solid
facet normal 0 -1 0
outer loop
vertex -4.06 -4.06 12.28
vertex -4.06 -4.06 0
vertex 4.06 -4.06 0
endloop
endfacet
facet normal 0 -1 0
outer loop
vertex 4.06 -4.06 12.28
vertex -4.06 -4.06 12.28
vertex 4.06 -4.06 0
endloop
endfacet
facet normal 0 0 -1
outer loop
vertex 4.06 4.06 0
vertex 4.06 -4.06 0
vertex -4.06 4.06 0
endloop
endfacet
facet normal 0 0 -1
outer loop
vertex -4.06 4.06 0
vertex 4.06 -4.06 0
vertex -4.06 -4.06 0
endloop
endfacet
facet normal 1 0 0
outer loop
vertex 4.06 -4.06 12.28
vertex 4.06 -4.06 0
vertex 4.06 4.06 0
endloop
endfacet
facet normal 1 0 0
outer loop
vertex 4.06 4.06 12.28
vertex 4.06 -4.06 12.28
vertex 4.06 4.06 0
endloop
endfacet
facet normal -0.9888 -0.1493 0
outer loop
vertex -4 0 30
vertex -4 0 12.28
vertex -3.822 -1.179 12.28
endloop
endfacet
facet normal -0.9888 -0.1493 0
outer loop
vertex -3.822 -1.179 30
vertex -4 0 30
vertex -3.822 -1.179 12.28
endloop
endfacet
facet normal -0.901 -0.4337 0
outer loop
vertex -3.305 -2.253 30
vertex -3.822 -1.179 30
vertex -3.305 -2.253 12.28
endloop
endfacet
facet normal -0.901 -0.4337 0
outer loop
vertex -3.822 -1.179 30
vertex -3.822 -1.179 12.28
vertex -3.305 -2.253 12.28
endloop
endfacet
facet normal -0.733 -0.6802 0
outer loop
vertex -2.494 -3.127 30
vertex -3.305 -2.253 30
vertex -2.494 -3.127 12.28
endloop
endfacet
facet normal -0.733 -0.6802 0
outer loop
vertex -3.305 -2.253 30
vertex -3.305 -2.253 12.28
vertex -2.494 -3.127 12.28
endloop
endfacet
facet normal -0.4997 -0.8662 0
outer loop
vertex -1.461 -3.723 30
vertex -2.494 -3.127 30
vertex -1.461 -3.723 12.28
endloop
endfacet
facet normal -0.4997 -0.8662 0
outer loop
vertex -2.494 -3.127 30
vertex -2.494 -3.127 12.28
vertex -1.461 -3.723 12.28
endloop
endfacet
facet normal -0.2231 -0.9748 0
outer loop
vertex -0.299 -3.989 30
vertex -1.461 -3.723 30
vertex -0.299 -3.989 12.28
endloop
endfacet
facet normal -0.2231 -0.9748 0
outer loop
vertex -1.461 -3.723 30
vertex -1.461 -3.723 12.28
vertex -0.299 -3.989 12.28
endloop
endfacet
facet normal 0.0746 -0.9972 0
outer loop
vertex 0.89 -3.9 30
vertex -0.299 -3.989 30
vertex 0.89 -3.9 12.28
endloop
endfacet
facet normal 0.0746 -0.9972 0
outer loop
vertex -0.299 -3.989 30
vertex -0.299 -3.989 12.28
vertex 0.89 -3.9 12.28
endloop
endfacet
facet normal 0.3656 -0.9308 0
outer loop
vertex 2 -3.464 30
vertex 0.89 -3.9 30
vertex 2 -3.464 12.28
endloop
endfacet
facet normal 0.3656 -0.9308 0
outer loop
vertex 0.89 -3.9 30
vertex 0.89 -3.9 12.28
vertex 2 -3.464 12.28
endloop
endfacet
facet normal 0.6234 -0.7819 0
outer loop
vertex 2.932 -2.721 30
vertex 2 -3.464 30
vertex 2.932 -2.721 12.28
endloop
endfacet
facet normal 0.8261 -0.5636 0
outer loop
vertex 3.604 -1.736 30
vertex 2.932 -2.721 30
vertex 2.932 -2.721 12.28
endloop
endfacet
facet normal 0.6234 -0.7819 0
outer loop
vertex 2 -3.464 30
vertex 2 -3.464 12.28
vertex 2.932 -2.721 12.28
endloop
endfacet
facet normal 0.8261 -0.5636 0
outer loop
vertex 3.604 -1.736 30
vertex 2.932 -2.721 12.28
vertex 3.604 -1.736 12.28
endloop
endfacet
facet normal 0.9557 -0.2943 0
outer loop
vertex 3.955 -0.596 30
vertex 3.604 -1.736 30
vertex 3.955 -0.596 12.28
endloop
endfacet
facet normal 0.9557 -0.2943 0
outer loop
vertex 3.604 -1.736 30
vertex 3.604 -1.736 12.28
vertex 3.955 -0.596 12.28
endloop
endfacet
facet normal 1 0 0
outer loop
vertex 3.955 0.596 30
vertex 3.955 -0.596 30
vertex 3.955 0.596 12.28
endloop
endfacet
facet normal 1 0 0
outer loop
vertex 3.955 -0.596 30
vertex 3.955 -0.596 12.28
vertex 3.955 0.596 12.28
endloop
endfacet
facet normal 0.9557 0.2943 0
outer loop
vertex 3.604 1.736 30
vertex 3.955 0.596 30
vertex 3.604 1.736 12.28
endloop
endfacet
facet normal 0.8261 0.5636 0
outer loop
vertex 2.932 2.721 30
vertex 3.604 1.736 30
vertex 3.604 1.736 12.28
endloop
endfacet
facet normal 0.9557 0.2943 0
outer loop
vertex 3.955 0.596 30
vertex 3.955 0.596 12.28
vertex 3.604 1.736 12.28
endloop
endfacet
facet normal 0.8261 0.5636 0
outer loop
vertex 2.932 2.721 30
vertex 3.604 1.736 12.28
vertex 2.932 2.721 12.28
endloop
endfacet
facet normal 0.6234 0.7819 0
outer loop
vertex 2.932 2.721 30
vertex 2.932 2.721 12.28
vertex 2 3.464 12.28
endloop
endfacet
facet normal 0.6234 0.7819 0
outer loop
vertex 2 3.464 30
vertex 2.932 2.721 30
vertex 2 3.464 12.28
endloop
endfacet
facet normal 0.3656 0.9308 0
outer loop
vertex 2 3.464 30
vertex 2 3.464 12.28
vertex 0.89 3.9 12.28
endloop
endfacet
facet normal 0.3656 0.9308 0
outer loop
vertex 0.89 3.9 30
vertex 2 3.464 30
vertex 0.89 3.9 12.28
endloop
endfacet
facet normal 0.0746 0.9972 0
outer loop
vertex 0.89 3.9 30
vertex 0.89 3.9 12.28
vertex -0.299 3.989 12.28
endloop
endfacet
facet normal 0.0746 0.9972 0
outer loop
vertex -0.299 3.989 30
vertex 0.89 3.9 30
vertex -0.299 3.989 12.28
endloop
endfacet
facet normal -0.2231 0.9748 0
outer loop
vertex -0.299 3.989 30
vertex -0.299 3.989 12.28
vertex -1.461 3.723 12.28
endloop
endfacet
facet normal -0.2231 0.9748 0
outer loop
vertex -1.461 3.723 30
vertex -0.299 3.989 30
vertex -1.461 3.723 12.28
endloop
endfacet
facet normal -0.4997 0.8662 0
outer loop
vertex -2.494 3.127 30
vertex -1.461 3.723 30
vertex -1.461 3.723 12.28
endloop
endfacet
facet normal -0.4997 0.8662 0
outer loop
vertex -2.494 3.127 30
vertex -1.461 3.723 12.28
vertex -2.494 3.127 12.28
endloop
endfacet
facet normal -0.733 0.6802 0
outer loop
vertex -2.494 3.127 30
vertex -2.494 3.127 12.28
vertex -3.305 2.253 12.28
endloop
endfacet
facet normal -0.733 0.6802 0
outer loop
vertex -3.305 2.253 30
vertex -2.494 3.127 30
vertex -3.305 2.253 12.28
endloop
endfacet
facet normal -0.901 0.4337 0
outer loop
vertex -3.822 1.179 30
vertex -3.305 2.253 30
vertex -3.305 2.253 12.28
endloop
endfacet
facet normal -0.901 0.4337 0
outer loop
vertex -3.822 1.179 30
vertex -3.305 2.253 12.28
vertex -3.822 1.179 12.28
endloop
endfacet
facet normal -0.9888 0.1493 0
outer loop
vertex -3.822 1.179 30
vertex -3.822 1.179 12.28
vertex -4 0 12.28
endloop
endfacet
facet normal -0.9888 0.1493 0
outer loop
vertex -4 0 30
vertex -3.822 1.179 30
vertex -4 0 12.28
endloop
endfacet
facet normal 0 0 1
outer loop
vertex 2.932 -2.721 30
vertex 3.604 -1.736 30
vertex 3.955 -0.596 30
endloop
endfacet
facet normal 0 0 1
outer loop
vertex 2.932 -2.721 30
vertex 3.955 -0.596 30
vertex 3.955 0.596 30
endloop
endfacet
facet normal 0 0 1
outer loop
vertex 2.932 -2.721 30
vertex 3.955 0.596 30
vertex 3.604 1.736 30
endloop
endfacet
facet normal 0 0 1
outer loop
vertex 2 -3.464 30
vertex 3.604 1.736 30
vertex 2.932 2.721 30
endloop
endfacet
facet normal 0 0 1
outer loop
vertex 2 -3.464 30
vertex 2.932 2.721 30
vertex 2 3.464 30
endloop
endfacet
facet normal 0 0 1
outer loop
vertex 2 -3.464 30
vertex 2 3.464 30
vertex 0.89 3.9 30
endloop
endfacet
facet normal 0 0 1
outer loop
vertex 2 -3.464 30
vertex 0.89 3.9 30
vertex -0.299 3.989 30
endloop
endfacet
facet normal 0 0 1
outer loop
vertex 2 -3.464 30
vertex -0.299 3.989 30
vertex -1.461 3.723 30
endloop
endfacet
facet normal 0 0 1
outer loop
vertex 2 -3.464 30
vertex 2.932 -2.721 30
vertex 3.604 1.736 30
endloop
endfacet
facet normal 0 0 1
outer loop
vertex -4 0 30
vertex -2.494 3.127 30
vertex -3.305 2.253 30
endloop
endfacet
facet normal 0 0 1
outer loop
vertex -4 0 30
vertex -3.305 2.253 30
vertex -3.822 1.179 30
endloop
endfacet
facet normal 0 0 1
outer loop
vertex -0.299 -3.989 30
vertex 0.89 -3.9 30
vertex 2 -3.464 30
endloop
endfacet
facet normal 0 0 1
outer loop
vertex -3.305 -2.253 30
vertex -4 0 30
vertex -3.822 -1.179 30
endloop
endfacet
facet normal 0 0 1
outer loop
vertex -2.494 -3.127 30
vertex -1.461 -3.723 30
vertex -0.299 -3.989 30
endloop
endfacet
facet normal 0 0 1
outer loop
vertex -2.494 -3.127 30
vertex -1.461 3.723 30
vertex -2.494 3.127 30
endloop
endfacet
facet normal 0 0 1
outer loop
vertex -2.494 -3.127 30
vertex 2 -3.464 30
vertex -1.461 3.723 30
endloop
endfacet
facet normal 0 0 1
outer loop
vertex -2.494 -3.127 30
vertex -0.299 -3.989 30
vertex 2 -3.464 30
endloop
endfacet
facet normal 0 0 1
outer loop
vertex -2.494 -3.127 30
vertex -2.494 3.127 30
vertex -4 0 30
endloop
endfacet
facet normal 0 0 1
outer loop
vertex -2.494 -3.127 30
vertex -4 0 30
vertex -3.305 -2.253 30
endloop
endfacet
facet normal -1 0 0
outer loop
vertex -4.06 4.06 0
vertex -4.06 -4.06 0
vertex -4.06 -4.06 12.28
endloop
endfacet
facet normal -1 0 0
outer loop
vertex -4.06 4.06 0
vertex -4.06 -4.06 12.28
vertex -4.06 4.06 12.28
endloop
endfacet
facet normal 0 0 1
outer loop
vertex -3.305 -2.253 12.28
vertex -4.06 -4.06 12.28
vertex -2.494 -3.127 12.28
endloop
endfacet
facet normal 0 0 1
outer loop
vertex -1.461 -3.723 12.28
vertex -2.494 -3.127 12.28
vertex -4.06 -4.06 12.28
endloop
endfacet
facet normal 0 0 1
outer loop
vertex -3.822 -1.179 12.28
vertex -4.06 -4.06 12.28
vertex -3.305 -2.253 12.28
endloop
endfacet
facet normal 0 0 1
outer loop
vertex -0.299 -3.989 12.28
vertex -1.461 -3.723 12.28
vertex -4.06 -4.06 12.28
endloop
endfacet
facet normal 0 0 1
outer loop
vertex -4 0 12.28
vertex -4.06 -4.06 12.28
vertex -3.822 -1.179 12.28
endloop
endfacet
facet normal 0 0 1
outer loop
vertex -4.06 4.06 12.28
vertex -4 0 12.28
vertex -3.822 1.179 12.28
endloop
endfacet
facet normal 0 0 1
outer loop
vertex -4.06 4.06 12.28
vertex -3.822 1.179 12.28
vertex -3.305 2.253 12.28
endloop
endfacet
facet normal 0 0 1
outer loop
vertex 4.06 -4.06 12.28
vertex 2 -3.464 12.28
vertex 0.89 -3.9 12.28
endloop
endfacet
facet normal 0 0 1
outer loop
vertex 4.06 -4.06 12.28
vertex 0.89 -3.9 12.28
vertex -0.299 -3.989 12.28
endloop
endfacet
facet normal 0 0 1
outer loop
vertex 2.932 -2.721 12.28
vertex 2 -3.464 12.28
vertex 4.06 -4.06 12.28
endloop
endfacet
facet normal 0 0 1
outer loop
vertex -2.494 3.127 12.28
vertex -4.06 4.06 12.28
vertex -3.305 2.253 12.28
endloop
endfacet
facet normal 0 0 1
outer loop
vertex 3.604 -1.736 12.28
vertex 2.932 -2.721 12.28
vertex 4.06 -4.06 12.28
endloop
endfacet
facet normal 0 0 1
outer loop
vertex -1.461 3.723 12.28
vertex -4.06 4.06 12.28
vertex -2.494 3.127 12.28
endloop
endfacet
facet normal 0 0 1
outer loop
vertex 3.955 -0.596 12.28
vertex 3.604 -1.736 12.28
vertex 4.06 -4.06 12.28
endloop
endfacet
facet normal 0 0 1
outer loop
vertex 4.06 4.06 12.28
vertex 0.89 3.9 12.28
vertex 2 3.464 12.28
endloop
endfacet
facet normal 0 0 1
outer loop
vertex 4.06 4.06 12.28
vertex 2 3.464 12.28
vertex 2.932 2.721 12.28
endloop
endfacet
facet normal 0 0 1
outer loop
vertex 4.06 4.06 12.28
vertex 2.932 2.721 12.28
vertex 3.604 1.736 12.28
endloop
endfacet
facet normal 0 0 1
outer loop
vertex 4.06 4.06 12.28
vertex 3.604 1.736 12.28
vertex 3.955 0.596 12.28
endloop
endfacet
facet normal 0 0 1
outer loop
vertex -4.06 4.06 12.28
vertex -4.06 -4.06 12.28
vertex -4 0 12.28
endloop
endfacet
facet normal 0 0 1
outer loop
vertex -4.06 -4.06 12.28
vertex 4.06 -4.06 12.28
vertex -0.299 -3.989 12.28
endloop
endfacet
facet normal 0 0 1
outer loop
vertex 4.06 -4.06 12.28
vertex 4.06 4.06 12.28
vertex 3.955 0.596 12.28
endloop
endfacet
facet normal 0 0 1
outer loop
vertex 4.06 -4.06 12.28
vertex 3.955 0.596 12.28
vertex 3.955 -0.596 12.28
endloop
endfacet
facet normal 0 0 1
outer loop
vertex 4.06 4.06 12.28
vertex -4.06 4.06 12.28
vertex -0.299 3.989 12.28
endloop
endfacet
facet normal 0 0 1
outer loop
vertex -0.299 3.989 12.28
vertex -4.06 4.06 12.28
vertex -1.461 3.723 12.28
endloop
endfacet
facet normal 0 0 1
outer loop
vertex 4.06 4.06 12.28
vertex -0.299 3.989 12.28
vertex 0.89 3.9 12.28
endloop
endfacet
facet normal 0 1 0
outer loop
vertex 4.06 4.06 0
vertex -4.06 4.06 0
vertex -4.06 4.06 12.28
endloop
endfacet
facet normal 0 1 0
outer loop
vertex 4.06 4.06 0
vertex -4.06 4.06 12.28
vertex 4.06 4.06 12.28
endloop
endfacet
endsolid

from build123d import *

# Parameters (mm, degrees)
SKETCH1_W           = 8.12
SKETCH1_H           = 8.12
BOSS_EXTRUDE1_DEPTH = 12.28
SKETCH2_R           = 4
BOSS_EXTRUDE2_DEPTH = 30


with BuildPart() as part:
    # Sketch1 → Boss-Extrude1 (new body)
    with BuildSketch(Plane.XY):
        Rectangle(SKETCH1_W, SKETCH1_H)
    extrude(amount=BOSS_EXTRUDE1_DEPTH)

    # Sketch2 → Boss-Extrude2 (add)
    with BuildSketch(Plane.XY):
        with Locations(Location((0, 0, 0), (0, 0, 180))):
            Circle(SKETCH2_R)
    extrude(amount=BOSS_EXTRUDE2_DEPTH)


solid = part.part
